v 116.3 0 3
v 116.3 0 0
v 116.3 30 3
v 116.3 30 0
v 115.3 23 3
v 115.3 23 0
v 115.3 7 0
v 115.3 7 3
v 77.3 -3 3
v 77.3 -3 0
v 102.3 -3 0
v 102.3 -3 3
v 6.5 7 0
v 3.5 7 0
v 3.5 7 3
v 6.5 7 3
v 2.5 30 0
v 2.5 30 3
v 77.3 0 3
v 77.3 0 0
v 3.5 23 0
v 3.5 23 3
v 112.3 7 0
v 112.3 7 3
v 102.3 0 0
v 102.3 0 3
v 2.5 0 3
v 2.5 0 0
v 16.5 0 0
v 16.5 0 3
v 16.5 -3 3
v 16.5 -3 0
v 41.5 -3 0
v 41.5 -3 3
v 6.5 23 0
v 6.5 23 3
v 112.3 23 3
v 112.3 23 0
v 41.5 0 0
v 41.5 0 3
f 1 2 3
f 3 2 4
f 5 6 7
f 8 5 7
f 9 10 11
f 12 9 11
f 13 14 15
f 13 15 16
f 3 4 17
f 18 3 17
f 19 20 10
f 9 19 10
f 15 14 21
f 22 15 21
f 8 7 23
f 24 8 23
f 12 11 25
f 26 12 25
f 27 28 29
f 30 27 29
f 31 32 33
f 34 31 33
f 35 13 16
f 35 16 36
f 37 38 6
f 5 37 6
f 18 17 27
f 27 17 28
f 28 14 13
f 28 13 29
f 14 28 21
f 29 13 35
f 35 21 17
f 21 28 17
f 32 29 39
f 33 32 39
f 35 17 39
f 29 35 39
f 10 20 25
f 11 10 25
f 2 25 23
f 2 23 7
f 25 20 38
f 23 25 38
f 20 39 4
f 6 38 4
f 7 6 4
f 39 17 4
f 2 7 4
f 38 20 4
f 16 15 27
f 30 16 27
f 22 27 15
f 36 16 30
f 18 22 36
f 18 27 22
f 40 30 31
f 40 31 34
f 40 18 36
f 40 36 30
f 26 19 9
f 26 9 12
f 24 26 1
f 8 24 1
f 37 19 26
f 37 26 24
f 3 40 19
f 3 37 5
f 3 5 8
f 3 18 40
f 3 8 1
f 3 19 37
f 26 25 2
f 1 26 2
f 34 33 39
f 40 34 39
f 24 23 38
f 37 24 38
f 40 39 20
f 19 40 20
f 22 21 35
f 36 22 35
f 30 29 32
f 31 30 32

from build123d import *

# Parameters (mm, degrees)
SKETCH_2_W      = 3
SKETCH_2_H      = 16
EXTRUDE_1_DEPTH = 3


with BuildPart() as part:
    # 草图2 → 凸台-拉伸1 (new body)
    with BuildSketch(Plane.XY):
        Polygon((41.5, 0), (59.4, 0), (77.3, 0), (77.3, -3), (102.3, -3), (102.3, 0), (112.3, 0), (116.3, 0), (116.3, 30), (112.3, 30), (6.5, 30), (2.5, 30), (2.5, 0), (6.5, 0), (16.5, 0), (16.5, -3), (41.5, -3), align=None)
        with Locations((5, 15)):
            Rectangle(SKETCH_2_W, SKETCH_2_H, mode=Mode.SUBTRACT)
        Polygon((112.3, 15), (112.3, 23), (115.3, 23), (115.3, 7), (112.3, 7), align=None, mode=Mode.SUBTRACT)
    extrude(amount=EXTRUDE_1_DEPTH)


solid = part.part
